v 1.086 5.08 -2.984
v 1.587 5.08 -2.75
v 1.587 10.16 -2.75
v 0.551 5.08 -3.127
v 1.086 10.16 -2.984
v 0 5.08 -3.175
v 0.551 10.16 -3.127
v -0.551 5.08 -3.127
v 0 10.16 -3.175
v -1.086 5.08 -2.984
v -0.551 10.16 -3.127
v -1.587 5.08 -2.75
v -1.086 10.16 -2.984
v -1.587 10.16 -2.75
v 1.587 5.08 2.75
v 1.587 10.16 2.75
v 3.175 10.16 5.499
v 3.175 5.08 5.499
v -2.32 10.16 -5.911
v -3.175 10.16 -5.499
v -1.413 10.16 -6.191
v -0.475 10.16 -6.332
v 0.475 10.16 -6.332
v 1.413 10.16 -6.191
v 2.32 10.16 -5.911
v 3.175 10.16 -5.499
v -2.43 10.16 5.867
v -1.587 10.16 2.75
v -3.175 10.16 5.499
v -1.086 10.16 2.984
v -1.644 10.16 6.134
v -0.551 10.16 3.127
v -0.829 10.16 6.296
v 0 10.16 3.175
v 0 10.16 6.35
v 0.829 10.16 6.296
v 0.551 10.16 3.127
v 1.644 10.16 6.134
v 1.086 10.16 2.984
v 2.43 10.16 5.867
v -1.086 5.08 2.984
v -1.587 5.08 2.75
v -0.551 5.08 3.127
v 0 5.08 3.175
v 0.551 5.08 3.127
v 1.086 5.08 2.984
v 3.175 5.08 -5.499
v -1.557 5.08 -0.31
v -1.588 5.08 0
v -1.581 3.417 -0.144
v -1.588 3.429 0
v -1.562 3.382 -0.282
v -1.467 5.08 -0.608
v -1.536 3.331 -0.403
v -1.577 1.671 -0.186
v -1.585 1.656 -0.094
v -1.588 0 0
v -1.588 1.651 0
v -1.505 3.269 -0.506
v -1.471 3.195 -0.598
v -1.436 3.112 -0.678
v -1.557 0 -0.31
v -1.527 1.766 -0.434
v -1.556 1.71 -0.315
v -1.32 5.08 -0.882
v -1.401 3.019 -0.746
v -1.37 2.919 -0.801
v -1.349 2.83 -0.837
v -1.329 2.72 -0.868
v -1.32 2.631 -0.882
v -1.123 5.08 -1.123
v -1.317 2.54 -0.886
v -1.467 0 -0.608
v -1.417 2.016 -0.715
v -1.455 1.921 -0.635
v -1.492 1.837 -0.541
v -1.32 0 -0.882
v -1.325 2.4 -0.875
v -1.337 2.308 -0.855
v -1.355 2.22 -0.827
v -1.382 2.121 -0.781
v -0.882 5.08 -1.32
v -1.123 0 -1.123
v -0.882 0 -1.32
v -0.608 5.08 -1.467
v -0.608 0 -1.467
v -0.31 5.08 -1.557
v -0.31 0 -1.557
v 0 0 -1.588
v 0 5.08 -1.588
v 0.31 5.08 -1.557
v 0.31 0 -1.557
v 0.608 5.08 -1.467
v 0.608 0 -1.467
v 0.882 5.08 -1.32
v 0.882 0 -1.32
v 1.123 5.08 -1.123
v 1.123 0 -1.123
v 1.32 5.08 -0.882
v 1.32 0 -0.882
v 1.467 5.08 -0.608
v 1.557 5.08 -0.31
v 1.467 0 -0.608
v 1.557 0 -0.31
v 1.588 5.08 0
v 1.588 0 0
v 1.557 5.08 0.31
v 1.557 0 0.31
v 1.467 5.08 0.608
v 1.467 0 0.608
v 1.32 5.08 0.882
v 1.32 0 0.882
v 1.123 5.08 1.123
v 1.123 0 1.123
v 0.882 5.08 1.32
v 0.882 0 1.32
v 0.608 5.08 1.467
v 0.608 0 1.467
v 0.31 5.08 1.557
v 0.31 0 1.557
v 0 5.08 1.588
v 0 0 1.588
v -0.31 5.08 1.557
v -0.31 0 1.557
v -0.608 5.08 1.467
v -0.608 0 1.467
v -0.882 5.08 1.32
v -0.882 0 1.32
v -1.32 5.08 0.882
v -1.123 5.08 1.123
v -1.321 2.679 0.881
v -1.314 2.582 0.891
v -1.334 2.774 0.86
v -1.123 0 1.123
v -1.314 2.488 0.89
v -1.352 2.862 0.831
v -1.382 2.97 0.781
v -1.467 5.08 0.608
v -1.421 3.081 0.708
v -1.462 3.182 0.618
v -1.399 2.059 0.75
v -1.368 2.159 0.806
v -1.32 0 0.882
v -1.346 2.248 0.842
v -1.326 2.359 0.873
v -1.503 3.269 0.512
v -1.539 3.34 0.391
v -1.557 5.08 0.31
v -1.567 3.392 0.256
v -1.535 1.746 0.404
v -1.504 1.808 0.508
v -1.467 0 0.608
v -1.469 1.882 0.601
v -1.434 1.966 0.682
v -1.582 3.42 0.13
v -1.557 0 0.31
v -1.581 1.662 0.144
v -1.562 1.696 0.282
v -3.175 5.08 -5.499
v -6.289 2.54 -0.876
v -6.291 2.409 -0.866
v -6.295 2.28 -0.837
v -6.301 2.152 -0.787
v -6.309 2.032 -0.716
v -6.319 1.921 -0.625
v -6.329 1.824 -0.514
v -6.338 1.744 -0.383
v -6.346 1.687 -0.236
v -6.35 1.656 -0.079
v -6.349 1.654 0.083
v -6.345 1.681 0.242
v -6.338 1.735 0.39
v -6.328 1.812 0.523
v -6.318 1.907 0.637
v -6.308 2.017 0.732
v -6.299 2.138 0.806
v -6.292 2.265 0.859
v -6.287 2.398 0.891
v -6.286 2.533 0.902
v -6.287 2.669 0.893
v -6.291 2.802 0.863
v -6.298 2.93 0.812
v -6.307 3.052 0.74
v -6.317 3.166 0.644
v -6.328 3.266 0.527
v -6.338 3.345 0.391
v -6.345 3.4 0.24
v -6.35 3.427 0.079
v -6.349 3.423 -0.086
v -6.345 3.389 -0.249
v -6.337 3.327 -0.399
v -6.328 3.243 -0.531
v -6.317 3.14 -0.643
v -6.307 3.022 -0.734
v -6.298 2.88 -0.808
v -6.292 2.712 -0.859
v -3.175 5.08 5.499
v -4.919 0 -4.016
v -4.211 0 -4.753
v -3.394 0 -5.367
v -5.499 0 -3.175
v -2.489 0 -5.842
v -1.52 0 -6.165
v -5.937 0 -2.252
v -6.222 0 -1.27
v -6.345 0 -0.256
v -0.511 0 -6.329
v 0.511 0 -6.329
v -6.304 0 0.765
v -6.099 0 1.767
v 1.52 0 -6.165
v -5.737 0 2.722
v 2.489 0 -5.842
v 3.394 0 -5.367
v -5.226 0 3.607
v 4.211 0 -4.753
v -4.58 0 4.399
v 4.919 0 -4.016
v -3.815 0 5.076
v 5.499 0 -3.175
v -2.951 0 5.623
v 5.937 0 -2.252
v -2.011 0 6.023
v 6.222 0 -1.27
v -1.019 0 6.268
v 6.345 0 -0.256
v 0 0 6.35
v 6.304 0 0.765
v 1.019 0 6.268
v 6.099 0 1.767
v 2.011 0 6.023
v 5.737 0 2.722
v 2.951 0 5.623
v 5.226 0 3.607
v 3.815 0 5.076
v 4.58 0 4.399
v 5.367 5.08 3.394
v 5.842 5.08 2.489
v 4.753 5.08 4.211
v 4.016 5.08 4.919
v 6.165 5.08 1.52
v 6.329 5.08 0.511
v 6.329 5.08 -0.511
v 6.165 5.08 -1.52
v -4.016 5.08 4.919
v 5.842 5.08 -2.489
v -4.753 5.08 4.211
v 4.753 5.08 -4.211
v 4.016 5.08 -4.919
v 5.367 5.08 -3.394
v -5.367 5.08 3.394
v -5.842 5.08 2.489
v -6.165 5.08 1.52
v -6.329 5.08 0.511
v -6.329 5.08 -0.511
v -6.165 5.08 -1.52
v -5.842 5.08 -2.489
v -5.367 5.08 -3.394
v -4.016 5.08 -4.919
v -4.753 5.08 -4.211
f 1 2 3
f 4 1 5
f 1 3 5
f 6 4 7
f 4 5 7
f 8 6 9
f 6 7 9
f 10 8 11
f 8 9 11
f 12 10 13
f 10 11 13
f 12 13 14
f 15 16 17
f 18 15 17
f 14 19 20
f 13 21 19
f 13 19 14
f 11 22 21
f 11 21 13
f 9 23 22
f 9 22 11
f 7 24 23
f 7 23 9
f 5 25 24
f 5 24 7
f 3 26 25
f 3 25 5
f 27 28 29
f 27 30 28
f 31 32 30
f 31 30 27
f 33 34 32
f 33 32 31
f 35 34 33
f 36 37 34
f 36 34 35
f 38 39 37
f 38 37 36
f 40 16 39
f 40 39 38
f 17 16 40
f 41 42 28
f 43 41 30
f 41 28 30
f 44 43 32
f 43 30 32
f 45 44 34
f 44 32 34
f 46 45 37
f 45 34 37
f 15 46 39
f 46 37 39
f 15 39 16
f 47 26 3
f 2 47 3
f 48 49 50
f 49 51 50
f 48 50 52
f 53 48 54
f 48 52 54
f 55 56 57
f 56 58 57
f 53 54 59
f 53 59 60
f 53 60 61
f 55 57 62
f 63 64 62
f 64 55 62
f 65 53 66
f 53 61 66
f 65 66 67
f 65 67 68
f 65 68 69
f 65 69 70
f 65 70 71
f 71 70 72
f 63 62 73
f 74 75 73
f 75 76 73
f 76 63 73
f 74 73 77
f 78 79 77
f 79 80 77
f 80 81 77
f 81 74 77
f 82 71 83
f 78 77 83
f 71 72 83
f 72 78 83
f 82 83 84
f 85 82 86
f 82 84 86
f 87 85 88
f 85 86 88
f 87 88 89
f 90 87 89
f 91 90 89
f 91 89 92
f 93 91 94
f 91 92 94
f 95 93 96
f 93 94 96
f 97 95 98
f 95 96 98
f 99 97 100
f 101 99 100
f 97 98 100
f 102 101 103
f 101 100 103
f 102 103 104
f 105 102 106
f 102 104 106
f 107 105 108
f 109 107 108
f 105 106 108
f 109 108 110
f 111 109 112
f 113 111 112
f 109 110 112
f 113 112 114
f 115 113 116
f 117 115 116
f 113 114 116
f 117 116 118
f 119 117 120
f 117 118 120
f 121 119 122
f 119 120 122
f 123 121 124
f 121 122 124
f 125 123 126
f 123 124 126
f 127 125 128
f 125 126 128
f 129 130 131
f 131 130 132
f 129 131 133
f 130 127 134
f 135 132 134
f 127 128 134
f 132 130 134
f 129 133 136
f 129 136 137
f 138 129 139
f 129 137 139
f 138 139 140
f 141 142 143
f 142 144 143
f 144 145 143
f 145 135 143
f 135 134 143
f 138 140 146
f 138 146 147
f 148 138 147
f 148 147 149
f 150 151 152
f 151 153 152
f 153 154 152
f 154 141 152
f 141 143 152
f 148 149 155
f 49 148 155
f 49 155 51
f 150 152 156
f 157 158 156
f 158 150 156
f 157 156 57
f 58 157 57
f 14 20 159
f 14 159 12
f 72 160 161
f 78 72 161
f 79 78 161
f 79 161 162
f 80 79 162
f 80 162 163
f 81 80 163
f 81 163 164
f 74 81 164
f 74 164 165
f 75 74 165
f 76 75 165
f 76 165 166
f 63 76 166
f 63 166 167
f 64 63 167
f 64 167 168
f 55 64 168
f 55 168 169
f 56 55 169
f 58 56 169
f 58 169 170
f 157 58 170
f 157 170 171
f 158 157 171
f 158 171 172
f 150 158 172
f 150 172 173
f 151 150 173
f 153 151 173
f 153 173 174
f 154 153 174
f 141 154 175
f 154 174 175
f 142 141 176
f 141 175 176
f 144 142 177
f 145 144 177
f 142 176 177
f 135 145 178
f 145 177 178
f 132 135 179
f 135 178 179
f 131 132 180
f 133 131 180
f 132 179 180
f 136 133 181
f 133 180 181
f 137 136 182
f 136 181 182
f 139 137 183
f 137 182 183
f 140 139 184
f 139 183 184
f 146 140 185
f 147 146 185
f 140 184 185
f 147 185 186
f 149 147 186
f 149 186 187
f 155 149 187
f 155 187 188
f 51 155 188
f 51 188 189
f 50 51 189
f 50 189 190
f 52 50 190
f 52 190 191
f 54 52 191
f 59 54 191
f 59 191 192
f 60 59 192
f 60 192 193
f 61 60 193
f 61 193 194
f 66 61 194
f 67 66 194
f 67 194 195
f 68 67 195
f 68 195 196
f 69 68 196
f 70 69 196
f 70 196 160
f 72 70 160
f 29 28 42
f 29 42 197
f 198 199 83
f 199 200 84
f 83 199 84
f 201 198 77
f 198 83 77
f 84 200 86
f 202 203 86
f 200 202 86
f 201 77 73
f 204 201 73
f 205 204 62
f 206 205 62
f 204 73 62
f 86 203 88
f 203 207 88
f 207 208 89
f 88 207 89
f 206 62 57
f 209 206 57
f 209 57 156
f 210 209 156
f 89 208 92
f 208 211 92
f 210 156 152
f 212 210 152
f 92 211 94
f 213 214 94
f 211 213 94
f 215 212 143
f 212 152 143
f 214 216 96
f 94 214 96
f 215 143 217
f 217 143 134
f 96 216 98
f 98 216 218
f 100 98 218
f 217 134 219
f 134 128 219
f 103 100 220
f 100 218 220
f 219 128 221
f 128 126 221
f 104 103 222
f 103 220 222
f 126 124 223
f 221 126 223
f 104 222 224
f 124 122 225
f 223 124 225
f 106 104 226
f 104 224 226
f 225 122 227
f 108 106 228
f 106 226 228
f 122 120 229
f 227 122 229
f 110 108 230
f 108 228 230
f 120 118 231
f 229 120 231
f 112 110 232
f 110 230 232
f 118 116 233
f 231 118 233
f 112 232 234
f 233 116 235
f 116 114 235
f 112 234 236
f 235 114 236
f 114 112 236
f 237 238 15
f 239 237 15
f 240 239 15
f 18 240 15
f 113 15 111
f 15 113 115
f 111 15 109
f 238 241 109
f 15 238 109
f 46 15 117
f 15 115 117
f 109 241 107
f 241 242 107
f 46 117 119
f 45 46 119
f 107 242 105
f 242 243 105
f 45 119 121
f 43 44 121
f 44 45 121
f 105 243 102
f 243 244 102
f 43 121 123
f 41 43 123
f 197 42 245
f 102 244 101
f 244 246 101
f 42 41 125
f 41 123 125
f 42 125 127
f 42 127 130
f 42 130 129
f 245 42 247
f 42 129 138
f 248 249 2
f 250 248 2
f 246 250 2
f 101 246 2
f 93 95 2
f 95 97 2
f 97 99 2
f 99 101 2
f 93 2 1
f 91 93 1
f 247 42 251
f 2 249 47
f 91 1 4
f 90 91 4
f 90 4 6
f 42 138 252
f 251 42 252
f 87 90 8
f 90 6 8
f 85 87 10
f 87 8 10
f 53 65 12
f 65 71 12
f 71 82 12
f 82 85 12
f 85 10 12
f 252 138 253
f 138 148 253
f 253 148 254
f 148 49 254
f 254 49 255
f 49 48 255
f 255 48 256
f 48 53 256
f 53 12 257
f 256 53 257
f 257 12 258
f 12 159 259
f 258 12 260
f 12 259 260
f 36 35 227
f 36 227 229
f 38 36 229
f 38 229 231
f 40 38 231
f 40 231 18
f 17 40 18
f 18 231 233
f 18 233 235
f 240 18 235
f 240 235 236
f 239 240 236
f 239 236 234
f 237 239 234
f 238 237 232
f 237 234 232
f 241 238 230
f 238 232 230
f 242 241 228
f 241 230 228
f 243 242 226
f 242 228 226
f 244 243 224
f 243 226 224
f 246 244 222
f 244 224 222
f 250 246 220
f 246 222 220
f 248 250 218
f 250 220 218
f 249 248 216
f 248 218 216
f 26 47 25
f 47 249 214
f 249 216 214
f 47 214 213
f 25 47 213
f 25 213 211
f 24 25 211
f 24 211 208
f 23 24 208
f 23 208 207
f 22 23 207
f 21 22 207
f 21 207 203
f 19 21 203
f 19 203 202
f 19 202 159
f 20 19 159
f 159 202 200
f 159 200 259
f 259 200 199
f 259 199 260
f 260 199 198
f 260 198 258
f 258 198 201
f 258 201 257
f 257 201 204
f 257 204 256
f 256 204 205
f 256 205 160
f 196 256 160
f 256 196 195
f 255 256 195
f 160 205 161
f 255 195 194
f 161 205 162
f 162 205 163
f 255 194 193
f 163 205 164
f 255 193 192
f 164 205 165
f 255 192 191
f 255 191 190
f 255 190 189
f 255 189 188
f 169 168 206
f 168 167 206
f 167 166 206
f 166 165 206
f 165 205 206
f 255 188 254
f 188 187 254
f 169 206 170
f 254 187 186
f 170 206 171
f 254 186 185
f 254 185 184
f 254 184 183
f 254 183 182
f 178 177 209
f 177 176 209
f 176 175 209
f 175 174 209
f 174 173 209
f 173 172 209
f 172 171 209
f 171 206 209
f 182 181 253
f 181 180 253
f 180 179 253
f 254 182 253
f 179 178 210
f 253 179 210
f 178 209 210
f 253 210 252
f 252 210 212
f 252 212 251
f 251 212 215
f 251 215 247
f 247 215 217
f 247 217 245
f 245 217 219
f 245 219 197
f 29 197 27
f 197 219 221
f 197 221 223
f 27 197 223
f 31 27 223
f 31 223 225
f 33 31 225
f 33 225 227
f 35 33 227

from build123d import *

# Parameters (mm, degrees)
SKETCH1_R                    = 6.35
BOSS_EXTRUDE1_DEPTH          = 10.16
F_1_8_0_125_DIAMETER_HOLE1_D = 3.175
SKETCH4_R                    = 3.175
CUT_EXTRUDE1_DEPTH           = 5.08
CUT_EXTRUDE2_DEPTH           = 5.08
F_2_56_TAPPED_HOLE1_REACH    = 18.12
F_2_56_TAPPED_HOLE1_BORE_R   = 0.889


with BuildPart() as part:
    # Sketch1 → Boss-Extrude1 (new body)
    with BuildSketch(Plane(origin=(0, 0, 0), x_dir=(1, 0, 0), z_dir=(0, 1, 0))):
        with Locations(Location((0, 0, 0), (0, 0, 270))):
            Circle(SKETCH1_R)
    extrude(amount=BOSS_EXTRUDE1_DEPTH)

    # 1/8 (0.125) Diameter Hole1 (through all)
    with Locations(Plane(origin=(0, 10.16, 0), x_dir=(1, 0, 0), z_dir=(0, 1, 0))):
        with Locations((0, 0)):
            Hole(F_1_8_0_125_DIAMETER_HOLE1_D / 2)

    # Sketch4 → Cut-Extrude1 (cut)
    with BuildSketch(Plane(origin=(0, 10.16, 0), x_dir=(1, 0, 0), z_dir=(0, 1, 0))):
        with Locations(Location((0, 0, 0), (0, 0, 270))):
            Circle(SKETCH4_R)
    extrude(amount=-CUT_EXTRUDE1_DEPTH, mode=Mode.SUBTRACT)

    # Sketch5 → Cut-Extrude2 (cut)
    with BuildSketch(Plane(origin=(0, 10.16, 0), x_dir=(1, 0, 0), z_dir=(0, 1, 0))):
        Polygon((0, 0), (-7.62, -13.198227154), (-7.62, 13.198227154), align=None)
    cut_extrude2 = extrude(amount=-CUT_EXTRUDE2_DEPTH, mode=Mode.SUBTRACT)

    # Mirror1: Cut-Extrude2 across plane
    add(cut_extrude2.mirror(Plane(origin=(0, 0, 0), x_dir=(0, 0, 1), z_dir=(1, 0, 0))), mode=Mode.SUBTRACT)

    # #2-56 Tapped Hole1 bore (on position points) → #2-56 Tapped Hole1 (cut, up to next)
    with BuildSketch(Plane(origin=(-6.349986105, 2.54, 0.013284072), x_dir=(-0.002091979827, 0, -0.999997811808), z_dir=(-0.999997811808, 0, 0.002091979827)), mode=Mode.PRIVATE) as f_2_56_tapped_hole1_sk1:
        Circle(F_2_56_TAPPED_HOLE1_BORE_R)
    f_2_56_tapped_hole1_tool1 = extrude(f_2_56_tapped_hole1_sk1.sketch, amount=-F_2_56_TAPPED_HOLE1_REACH, mode=Mode.PRIVATE) & part.part
    add(f_2_56_tapped_hole1_tool1.solids().sort_by_distance((-6.349986, 2.54, 0.013284))[0], mode=Mode.SUBTRACT)


solid = part.part
